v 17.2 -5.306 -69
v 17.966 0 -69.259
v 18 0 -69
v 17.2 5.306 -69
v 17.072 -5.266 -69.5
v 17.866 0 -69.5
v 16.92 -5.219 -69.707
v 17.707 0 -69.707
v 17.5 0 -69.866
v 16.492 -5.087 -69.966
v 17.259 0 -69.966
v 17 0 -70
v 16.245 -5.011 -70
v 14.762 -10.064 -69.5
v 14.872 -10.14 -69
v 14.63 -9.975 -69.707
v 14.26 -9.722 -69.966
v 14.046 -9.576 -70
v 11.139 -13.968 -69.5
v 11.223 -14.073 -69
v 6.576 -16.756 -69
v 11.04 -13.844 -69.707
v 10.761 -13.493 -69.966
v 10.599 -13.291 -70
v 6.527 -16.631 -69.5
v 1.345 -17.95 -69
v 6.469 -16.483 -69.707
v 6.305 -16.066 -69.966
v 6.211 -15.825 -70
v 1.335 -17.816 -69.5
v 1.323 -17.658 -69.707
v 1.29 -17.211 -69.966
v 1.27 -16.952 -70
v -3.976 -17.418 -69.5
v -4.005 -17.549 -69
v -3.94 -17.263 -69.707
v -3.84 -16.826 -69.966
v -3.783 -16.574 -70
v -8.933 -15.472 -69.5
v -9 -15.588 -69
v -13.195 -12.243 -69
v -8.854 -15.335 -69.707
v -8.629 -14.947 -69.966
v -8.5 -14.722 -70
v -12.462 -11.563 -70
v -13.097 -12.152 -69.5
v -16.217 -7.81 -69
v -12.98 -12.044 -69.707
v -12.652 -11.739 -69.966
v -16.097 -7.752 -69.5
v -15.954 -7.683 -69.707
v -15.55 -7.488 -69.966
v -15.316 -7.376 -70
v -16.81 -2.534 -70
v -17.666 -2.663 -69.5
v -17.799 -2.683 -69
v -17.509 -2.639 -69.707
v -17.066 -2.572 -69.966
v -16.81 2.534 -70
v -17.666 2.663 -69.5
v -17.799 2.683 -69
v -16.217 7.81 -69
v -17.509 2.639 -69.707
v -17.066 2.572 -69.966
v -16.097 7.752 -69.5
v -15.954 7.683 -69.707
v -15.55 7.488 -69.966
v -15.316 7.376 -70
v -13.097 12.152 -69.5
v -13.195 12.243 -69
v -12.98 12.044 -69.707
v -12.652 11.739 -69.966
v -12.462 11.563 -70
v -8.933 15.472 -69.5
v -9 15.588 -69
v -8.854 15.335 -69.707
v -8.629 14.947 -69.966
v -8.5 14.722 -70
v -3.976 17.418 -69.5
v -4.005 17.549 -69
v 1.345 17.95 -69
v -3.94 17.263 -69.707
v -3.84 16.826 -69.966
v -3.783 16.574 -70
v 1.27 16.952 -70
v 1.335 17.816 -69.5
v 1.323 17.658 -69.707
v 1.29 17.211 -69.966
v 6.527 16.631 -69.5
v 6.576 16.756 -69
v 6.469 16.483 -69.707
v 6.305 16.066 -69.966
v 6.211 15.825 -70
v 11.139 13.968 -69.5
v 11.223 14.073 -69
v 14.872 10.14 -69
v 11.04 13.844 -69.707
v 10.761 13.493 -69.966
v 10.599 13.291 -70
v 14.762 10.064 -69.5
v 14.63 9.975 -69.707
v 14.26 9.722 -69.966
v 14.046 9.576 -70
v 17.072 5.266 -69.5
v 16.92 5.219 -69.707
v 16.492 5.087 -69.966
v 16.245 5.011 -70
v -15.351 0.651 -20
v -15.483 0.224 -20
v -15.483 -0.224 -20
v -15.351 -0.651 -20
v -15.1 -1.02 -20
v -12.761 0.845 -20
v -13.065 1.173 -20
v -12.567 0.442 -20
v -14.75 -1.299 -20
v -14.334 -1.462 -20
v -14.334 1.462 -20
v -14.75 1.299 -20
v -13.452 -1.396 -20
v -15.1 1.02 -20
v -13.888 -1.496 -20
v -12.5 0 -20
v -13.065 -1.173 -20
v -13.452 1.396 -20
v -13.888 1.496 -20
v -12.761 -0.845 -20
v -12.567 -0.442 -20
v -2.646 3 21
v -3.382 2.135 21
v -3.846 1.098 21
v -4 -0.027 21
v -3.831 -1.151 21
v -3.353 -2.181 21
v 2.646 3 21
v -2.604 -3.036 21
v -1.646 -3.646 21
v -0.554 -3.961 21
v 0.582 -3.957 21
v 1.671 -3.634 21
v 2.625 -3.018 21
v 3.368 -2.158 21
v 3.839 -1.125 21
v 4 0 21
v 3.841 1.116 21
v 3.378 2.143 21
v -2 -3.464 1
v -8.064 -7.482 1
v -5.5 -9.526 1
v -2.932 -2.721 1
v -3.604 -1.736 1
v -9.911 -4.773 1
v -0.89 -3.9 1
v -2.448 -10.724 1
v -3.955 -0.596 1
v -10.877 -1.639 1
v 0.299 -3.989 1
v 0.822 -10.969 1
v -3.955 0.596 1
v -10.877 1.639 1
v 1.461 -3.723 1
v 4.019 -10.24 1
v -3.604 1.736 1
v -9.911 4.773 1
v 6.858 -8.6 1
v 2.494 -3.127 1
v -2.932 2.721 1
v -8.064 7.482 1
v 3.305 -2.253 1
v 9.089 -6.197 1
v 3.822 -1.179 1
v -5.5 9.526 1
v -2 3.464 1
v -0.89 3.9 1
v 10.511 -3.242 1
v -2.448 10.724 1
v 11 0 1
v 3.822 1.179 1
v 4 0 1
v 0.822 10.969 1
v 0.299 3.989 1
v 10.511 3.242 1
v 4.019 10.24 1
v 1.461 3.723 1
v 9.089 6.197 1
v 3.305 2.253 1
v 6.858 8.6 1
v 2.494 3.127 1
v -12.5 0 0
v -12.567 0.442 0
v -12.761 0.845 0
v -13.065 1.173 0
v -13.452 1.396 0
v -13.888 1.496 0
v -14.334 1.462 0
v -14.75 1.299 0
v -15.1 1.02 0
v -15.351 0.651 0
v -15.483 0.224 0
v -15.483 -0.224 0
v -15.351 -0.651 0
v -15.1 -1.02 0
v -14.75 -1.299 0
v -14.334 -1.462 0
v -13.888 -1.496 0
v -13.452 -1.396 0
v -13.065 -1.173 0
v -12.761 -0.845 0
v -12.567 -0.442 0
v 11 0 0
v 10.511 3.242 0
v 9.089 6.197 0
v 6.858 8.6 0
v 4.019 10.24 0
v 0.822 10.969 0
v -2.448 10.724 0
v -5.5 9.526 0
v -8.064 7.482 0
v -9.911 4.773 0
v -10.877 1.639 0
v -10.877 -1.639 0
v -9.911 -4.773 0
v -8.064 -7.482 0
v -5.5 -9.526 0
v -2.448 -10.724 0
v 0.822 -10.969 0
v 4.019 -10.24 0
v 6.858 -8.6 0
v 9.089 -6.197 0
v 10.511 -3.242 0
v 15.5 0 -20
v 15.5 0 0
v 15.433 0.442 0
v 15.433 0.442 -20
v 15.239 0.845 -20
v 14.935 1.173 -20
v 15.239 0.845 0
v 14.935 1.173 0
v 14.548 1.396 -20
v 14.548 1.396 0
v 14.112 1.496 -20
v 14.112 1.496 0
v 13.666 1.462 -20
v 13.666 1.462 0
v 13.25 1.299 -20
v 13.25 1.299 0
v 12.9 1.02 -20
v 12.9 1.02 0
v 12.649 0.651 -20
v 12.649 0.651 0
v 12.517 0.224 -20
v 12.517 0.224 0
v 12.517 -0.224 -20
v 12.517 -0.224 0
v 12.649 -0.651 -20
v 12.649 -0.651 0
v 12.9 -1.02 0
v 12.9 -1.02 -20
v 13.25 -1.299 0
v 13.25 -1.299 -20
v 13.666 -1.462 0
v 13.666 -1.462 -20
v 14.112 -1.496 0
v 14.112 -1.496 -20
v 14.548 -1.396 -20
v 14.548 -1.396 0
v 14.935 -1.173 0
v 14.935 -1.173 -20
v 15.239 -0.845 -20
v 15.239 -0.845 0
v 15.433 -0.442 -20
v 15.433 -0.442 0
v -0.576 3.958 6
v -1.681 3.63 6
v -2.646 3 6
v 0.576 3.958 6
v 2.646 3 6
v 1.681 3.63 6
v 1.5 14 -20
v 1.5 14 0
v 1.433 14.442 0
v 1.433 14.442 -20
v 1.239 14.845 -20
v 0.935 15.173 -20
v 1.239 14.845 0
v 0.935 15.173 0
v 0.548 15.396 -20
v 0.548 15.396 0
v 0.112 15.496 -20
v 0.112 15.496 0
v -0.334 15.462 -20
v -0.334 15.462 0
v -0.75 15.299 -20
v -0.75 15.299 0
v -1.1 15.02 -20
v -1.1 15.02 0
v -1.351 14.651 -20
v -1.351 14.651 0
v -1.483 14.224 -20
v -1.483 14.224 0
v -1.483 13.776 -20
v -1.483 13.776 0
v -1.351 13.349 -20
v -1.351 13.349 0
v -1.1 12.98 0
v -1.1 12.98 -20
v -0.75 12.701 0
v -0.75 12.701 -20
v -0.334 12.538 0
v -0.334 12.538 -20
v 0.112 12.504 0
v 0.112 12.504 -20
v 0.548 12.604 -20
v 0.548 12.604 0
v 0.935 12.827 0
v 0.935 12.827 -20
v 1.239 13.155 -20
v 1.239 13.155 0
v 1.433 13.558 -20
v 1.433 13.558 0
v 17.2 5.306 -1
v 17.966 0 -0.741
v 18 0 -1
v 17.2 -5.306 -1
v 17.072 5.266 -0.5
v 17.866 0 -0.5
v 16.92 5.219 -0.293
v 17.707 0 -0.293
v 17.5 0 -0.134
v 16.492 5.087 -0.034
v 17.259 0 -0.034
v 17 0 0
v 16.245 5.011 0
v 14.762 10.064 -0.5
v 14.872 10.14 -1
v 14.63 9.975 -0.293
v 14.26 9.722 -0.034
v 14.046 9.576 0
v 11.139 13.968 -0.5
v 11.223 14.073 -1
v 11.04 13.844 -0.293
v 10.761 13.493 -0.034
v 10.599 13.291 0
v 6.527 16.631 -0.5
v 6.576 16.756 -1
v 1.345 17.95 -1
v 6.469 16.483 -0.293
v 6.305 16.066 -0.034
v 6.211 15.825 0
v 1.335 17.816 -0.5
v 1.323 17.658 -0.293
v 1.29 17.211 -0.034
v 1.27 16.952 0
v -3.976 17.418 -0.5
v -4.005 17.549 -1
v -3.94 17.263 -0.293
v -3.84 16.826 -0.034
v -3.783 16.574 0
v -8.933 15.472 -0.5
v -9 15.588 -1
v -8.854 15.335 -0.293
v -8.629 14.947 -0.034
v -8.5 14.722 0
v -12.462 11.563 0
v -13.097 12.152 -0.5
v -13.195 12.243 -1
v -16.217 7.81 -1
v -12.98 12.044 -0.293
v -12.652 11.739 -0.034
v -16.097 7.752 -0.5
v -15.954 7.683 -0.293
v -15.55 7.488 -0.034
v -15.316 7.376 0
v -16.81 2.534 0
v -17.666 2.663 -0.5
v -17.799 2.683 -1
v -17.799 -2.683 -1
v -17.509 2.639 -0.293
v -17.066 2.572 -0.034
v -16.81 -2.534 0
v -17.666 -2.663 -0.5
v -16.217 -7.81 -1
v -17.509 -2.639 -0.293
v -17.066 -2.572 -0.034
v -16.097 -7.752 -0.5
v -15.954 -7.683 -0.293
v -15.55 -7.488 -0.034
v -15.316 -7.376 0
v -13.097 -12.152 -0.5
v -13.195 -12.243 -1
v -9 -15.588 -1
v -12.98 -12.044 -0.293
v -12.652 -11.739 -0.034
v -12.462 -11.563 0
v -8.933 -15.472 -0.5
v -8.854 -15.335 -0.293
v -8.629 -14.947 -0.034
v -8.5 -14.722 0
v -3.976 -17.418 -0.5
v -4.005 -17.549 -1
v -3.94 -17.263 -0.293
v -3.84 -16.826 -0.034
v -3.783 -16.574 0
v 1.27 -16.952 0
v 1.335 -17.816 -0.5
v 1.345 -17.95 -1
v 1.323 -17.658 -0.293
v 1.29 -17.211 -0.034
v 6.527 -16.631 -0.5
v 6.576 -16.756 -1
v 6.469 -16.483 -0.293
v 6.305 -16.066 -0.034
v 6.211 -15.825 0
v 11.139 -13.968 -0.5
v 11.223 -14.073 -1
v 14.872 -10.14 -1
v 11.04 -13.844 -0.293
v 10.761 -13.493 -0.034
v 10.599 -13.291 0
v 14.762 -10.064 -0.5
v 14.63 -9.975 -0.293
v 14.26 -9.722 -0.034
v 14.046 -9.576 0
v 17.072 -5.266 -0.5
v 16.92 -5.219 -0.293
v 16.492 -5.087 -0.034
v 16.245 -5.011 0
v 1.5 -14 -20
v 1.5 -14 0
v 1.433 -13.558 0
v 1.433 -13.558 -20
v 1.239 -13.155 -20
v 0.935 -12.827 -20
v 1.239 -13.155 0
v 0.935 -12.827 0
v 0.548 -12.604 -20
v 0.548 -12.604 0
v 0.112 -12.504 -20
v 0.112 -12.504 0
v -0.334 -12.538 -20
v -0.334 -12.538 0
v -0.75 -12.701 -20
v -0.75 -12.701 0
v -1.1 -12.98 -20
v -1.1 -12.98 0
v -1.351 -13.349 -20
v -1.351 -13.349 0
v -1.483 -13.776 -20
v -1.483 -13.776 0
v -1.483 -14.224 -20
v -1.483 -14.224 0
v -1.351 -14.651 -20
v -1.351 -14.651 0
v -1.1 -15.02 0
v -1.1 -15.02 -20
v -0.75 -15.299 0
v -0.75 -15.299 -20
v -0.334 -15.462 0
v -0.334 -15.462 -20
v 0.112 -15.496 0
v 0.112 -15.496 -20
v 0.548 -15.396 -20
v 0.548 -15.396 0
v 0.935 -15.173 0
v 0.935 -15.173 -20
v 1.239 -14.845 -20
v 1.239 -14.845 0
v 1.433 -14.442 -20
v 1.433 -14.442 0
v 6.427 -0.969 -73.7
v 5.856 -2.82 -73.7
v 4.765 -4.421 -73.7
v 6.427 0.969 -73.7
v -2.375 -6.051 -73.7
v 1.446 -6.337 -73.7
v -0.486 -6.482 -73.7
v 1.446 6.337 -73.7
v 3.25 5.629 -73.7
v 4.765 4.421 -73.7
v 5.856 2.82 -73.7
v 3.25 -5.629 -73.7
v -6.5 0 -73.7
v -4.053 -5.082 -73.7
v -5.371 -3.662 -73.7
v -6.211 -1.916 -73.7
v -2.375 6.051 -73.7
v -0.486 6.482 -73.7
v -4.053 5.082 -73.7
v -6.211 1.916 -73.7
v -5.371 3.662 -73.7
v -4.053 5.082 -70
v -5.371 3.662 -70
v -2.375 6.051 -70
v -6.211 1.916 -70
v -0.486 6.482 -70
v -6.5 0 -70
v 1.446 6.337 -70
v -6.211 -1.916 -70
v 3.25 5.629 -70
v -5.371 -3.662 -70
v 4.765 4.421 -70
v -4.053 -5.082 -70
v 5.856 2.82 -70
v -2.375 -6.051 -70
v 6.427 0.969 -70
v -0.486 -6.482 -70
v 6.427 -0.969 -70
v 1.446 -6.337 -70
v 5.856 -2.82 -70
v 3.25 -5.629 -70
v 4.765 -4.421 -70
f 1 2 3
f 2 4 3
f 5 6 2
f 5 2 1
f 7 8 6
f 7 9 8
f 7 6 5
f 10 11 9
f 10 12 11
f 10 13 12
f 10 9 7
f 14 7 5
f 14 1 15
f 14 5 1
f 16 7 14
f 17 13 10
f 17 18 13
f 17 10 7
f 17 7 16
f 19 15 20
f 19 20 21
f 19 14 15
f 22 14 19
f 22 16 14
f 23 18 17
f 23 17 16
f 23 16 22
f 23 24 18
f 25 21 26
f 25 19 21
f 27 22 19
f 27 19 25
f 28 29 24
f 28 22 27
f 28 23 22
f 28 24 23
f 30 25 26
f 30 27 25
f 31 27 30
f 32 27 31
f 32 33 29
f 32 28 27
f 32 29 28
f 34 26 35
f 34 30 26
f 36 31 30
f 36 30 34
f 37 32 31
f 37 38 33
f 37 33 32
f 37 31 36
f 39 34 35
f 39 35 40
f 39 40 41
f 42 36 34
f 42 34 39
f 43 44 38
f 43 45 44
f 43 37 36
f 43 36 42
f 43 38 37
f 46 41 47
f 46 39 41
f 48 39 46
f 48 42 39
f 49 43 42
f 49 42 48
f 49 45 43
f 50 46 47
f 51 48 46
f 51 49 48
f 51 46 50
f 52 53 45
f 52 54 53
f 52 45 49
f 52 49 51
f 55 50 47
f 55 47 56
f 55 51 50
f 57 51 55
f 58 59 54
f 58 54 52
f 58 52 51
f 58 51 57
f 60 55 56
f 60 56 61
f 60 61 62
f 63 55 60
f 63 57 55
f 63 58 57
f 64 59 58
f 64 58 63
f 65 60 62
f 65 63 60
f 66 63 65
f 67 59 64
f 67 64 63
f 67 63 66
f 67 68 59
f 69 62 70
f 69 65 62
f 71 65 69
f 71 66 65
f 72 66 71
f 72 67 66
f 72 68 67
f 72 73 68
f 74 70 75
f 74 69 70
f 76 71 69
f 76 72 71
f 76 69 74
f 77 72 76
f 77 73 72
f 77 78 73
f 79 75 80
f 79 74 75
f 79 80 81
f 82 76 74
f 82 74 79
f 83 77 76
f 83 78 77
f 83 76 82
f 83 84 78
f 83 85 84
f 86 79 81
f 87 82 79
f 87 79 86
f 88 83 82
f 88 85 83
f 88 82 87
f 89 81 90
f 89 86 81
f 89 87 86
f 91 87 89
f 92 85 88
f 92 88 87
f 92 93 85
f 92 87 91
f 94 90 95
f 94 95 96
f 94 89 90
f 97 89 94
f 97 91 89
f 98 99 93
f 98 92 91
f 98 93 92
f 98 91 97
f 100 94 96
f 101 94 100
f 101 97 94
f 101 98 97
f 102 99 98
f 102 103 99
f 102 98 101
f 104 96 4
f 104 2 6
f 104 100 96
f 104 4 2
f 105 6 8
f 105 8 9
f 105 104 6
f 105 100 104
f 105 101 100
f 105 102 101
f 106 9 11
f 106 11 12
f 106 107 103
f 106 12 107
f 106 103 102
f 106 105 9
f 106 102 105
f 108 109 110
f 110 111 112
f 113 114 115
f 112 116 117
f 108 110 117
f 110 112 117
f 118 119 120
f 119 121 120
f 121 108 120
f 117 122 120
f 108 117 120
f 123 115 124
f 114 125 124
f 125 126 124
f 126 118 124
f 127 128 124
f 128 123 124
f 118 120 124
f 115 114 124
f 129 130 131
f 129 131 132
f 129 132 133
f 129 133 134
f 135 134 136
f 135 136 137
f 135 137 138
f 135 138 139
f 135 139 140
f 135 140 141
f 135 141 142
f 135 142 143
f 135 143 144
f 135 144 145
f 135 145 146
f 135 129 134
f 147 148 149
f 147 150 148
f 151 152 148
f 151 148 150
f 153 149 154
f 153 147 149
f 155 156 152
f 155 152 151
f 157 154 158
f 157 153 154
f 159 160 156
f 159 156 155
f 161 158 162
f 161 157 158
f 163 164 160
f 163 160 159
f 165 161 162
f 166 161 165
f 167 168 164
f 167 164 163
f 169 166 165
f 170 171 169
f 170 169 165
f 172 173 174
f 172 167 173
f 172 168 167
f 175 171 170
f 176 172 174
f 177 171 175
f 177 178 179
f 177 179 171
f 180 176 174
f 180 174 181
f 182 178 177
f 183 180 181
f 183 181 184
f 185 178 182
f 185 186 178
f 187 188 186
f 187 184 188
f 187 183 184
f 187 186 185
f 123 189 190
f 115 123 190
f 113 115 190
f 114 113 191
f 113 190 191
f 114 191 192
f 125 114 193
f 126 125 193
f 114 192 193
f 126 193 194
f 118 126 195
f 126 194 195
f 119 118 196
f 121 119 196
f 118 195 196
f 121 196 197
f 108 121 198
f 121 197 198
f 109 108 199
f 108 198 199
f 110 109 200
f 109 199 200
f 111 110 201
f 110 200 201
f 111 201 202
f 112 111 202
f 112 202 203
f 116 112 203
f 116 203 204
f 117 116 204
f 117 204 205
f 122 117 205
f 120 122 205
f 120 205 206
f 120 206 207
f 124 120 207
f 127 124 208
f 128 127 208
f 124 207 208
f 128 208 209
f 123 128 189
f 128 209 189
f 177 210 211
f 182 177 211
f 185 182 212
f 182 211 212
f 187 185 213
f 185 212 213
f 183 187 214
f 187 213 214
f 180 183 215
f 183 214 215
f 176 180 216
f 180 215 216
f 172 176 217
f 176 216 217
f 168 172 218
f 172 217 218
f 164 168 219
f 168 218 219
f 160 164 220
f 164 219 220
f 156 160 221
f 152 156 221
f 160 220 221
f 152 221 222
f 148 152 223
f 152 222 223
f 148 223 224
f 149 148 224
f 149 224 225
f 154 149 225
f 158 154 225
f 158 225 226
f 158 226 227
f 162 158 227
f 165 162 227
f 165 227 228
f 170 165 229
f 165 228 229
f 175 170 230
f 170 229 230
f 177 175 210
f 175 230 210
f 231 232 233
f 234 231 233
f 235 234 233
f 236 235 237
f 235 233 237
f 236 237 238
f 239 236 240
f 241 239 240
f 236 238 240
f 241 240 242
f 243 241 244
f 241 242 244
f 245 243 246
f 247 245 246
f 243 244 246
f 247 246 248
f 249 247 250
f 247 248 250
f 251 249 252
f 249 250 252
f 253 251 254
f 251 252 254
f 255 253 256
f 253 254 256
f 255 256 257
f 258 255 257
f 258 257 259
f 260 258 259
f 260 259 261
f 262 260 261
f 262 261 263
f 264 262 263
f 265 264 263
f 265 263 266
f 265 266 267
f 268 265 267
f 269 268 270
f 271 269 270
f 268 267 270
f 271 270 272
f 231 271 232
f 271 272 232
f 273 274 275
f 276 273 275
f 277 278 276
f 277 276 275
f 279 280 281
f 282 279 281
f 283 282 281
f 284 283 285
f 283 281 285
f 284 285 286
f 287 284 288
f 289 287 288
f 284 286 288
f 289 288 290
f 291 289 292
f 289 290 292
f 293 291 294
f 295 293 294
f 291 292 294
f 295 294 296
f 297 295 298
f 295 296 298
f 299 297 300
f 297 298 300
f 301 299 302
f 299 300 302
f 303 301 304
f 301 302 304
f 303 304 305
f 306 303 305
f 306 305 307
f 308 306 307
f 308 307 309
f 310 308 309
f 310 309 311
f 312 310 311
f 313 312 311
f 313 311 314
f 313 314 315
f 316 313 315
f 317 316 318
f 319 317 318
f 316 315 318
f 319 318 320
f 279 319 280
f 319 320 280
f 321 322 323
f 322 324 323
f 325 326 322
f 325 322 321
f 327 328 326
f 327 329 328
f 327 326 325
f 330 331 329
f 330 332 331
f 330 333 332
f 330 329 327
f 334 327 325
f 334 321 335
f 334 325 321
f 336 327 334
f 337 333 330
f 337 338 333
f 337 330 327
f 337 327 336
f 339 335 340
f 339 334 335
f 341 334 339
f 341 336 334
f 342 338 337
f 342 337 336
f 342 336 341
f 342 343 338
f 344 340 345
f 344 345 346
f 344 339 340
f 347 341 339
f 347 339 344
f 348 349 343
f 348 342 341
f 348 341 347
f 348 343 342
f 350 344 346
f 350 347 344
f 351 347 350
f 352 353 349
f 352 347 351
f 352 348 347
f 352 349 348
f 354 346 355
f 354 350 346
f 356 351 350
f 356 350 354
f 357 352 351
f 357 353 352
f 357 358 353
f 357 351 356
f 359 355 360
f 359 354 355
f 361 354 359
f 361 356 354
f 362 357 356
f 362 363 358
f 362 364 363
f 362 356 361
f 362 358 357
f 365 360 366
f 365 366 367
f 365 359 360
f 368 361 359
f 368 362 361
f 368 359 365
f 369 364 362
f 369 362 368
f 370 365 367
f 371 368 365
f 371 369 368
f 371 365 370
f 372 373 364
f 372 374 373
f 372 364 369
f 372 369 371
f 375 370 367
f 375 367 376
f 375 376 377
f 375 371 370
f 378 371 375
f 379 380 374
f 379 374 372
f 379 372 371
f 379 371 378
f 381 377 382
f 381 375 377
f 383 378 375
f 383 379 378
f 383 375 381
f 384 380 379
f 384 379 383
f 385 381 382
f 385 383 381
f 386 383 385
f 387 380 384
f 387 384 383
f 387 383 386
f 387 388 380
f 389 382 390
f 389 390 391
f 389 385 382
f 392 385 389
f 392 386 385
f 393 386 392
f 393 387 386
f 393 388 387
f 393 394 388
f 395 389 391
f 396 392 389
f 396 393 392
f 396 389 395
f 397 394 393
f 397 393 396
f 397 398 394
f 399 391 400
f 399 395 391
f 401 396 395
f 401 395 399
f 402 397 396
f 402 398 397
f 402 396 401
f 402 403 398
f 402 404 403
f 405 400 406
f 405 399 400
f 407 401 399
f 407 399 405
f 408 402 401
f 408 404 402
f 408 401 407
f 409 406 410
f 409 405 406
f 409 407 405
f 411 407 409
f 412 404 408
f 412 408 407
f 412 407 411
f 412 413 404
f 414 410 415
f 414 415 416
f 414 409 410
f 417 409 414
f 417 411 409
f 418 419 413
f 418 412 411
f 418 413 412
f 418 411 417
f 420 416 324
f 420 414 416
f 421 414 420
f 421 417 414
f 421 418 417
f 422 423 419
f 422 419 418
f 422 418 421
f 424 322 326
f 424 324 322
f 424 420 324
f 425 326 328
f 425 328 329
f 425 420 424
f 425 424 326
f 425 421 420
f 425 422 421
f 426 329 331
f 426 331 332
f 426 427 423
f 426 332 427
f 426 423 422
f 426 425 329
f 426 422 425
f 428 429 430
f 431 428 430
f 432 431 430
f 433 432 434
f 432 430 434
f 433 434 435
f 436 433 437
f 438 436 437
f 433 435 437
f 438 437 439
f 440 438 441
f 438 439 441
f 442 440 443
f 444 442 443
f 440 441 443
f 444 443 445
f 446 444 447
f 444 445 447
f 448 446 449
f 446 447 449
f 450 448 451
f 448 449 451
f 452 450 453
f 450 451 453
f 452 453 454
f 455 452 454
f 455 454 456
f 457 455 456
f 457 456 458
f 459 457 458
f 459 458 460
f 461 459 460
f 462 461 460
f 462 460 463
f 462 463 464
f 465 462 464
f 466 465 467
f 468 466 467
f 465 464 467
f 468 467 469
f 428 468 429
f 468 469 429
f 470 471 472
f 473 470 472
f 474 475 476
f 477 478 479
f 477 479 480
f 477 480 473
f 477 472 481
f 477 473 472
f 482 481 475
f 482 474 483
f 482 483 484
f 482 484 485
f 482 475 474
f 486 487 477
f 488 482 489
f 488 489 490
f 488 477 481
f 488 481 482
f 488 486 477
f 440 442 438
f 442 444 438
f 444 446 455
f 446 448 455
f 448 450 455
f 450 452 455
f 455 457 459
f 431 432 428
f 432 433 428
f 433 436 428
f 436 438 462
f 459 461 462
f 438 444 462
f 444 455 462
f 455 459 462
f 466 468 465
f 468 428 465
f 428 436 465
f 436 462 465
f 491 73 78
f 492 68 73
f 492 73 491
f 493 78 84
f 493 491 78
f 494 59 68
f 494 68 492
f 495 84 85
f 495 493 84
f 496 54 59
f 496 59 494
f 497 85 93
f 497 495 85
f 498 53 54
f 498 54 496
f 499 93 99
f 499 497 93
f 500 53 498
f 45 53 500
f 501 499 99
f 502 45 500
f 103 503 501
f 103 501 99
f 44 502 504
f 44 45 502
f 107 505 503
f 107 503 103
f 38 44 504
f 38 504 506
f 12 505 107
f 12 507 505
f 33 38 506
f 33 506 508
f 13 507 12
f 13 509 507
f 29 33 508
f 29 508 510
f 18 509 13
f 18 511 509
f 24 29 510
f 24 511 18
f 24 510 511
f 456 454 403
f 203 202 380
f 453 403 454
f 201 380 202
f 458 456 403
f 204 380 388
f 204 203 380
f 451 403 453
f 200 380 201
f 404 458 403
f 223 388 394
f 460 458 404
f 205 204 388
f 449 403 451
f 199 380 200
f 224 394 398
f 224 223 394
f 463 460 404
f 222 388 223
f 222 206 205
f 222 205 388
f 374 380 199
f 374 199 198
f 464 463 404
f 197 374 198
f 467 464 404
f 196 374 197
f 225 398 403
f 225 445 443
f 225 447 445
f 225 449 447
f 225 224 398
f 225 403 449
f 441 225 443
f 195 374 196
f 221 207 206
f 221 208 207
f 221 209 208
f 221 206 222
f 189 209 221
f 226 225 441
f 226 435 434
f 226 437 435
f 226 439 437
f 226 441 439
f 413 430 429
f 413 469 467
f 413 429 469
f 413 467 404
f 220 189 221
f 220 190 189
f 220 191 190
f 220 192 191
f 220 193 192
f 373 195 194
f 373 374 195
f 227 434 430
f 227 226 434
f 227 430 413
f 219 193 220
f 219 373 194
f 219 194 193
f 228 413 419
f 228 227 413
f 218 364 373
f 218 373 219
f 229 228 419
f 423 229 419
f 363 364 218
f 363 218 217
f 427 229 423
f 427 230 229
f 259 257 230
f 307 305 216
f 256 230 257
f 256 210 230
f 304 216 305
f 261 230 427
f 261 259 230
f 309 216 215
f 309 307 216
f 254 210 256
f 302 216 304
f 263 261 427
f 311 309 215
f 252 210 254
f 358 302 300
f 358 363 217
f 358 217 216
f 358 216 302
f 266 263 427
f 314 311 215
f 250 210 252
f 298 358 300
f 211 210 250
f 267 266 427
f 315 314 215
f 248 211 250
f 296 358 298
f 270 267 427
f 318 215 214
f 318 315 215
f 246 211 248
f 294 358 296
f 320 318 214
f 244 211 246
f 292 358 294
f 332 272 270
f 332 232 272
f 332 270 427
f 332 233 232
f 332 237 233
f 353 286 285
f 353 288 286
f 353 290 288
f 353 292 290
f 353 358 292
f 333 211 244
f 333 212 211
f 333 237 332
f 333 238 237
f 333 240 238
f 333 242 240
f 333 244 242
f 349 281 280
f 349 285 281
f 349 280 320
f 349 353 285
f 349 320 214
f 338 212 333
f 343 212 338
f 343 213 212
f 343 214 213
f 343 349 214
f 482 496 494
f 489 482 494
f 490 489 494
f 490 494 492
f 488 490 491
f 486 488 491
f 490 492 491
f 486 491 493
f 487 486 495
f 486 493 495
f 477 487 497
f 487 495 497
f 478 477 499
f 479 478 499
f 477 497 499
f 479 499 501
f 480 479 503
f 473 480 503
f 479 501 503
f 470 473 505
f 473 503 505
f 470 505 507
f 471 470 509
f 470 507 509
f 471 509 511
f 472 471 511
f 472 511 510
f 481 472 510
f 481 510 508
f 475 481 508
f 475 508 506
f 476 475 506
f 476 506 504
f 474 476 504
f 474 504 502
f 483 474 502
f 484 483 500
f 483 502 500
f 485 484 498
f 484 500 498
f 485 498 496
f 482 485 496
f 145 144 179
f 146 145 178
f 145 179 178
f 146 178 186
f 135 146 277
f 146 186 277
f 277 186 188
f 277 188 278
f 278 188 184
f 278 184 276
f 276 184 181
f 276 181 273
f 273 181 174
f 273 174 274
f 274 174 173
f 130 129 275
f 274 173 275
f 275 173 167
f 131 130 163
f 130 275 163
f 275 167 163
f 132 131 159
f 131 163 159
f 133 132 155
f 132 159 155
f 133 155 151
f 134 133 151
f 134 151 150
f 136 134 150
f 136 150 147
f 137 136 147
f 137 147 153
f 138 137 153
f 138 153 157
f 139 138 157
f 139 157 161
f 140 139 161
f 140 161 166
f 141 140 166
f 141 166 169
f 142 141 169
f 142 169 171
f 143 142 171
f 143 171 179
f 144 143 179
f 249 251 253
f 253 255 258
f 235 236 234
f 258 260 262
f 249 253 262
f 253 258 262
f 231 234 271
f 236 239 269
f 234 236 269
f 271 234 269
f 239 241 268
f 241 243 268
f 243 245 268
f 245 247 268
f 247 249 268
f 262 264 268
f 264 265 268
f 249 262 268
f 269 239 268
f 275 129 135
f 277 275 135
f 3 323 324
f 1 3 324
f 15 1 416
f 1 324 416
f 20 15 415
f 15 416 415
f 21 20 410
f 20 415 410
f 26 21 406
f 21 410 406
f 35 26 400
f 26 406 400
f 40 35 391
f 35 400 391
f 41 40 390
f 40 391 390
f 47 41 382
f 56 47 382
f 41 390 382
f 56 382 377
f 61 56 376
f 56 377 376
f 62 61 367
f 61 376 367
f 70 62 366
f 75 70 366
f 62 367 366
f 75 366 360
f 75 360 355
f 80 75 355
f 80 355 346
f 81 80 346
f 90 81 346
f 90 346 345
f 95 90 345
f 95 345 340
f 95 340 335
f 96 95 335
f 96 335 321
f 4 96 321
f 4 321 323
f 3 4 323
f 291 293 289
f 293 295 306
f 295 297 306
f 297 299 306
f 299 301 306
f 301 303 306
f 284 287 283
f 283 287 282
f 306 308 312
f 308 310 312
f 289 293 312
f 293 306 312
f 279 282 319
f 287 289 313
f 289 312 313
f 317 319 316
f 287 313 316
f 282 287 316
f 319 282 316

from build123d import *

# Parameters (mm, degrees)
SKETCH1_R           = 18
SKETCH1_R_2         = 1.5
GEAR_DEPTH          = 20
SKETCH2_R           = 18
MOTOR_DEPTH         = 50
SKETCH3_R           = 6.5
BOSS_EXTRUDE3_DEPTH = 3.7
SKETCH4_R           = 11
BOSS_EXTRUDE4_DEPTH = 1
SKETCH5_R           = 4
SHAFT_DEPTH         = 20
CUT_EXTRUDE1_DEPTH  = 15
FILLET1_R           = 1


with BuildPart() as part:
    # Sketch1 → Gear (new body)
    with BuildSketch(Plane.XY):
        Circle(SKETCH1_R)
        with Locations((0, 14)):
            Circle(SKETCH1_R_2, mode=Mode.SUBTRACT)
        with Locations((14, 0)):
            Circle(SKETCH1_R_2, mode=Mode.SUBTRACT)
        with Locations((0, -14)):
            Circle(SKETCH1_R_2, mode=Mode.SUBTRACT)
        with Locations((-14, 0)):
            Circle(SKETCH1_R_2, mode=Mode.SUBTRACT)
    extrude(amount=-GEAR_DEPTH)

    # Sketch2 → Motor (add)
    with BuildSketch(Plane(origin=(0, 0, -20), x_dir=(-1, 0, 0), z_dir=(0, 0, -1))):
        with Locations(Location((0, 0, 0), (0, 0, 180))):
            Circle(SKETCH2_R)
    extrude(amount=MOTOR_DEPTH)

    # Sketch3 → Boss-Extrude3 (add)
    with BuildSketch(Plane(origin=(0, 0, -70), x_dir=(-1, 0, 0), z_dir=(0, 0, -1))):
        Circle(SKETCH3_R)
    extrude(amount=BOSS_EXTRUDE3_DEPTH)

    # Sketch4 → Boss-Extrude4 (add)
    with BuildSketch(Plane.XY):
        Circle(SKETCH4_R)
    extrude(amount=BOSS_EXTRUDE4_DEPTH)

    # Sketch5 → shaft (add)
    with BuildSketch(Plane.XY.offset(1)):
        Circle(SKETCH5_R)
    extrude(amount=SHAFT_DEPTH)

    # Sketch6 → Cut-Extrude1 (cut)
    with BuildSketch(Plane.XY.offset(21)):
        Polygon((-71.543868334, 3), (-2.645751311, 3), (2.645751311, 3), (71.543868334, 3), (71.543868334, 140.796234045), (-71.543868334, 140.796234045), align=None)
    extrude(amount=-CUT_EXTRUDE1_DEPTH, mode=Mode.SUBTRACT)

    # Fillet1
    fillet1_edges = [part.edges().sort_by_distance(p)[0] for p in [
        (-18, 0, 0),
        (-18, 0, -70),
    ]]
    fillet(fillet1_edges, radius=FILLET1_R)


solid = part.part
